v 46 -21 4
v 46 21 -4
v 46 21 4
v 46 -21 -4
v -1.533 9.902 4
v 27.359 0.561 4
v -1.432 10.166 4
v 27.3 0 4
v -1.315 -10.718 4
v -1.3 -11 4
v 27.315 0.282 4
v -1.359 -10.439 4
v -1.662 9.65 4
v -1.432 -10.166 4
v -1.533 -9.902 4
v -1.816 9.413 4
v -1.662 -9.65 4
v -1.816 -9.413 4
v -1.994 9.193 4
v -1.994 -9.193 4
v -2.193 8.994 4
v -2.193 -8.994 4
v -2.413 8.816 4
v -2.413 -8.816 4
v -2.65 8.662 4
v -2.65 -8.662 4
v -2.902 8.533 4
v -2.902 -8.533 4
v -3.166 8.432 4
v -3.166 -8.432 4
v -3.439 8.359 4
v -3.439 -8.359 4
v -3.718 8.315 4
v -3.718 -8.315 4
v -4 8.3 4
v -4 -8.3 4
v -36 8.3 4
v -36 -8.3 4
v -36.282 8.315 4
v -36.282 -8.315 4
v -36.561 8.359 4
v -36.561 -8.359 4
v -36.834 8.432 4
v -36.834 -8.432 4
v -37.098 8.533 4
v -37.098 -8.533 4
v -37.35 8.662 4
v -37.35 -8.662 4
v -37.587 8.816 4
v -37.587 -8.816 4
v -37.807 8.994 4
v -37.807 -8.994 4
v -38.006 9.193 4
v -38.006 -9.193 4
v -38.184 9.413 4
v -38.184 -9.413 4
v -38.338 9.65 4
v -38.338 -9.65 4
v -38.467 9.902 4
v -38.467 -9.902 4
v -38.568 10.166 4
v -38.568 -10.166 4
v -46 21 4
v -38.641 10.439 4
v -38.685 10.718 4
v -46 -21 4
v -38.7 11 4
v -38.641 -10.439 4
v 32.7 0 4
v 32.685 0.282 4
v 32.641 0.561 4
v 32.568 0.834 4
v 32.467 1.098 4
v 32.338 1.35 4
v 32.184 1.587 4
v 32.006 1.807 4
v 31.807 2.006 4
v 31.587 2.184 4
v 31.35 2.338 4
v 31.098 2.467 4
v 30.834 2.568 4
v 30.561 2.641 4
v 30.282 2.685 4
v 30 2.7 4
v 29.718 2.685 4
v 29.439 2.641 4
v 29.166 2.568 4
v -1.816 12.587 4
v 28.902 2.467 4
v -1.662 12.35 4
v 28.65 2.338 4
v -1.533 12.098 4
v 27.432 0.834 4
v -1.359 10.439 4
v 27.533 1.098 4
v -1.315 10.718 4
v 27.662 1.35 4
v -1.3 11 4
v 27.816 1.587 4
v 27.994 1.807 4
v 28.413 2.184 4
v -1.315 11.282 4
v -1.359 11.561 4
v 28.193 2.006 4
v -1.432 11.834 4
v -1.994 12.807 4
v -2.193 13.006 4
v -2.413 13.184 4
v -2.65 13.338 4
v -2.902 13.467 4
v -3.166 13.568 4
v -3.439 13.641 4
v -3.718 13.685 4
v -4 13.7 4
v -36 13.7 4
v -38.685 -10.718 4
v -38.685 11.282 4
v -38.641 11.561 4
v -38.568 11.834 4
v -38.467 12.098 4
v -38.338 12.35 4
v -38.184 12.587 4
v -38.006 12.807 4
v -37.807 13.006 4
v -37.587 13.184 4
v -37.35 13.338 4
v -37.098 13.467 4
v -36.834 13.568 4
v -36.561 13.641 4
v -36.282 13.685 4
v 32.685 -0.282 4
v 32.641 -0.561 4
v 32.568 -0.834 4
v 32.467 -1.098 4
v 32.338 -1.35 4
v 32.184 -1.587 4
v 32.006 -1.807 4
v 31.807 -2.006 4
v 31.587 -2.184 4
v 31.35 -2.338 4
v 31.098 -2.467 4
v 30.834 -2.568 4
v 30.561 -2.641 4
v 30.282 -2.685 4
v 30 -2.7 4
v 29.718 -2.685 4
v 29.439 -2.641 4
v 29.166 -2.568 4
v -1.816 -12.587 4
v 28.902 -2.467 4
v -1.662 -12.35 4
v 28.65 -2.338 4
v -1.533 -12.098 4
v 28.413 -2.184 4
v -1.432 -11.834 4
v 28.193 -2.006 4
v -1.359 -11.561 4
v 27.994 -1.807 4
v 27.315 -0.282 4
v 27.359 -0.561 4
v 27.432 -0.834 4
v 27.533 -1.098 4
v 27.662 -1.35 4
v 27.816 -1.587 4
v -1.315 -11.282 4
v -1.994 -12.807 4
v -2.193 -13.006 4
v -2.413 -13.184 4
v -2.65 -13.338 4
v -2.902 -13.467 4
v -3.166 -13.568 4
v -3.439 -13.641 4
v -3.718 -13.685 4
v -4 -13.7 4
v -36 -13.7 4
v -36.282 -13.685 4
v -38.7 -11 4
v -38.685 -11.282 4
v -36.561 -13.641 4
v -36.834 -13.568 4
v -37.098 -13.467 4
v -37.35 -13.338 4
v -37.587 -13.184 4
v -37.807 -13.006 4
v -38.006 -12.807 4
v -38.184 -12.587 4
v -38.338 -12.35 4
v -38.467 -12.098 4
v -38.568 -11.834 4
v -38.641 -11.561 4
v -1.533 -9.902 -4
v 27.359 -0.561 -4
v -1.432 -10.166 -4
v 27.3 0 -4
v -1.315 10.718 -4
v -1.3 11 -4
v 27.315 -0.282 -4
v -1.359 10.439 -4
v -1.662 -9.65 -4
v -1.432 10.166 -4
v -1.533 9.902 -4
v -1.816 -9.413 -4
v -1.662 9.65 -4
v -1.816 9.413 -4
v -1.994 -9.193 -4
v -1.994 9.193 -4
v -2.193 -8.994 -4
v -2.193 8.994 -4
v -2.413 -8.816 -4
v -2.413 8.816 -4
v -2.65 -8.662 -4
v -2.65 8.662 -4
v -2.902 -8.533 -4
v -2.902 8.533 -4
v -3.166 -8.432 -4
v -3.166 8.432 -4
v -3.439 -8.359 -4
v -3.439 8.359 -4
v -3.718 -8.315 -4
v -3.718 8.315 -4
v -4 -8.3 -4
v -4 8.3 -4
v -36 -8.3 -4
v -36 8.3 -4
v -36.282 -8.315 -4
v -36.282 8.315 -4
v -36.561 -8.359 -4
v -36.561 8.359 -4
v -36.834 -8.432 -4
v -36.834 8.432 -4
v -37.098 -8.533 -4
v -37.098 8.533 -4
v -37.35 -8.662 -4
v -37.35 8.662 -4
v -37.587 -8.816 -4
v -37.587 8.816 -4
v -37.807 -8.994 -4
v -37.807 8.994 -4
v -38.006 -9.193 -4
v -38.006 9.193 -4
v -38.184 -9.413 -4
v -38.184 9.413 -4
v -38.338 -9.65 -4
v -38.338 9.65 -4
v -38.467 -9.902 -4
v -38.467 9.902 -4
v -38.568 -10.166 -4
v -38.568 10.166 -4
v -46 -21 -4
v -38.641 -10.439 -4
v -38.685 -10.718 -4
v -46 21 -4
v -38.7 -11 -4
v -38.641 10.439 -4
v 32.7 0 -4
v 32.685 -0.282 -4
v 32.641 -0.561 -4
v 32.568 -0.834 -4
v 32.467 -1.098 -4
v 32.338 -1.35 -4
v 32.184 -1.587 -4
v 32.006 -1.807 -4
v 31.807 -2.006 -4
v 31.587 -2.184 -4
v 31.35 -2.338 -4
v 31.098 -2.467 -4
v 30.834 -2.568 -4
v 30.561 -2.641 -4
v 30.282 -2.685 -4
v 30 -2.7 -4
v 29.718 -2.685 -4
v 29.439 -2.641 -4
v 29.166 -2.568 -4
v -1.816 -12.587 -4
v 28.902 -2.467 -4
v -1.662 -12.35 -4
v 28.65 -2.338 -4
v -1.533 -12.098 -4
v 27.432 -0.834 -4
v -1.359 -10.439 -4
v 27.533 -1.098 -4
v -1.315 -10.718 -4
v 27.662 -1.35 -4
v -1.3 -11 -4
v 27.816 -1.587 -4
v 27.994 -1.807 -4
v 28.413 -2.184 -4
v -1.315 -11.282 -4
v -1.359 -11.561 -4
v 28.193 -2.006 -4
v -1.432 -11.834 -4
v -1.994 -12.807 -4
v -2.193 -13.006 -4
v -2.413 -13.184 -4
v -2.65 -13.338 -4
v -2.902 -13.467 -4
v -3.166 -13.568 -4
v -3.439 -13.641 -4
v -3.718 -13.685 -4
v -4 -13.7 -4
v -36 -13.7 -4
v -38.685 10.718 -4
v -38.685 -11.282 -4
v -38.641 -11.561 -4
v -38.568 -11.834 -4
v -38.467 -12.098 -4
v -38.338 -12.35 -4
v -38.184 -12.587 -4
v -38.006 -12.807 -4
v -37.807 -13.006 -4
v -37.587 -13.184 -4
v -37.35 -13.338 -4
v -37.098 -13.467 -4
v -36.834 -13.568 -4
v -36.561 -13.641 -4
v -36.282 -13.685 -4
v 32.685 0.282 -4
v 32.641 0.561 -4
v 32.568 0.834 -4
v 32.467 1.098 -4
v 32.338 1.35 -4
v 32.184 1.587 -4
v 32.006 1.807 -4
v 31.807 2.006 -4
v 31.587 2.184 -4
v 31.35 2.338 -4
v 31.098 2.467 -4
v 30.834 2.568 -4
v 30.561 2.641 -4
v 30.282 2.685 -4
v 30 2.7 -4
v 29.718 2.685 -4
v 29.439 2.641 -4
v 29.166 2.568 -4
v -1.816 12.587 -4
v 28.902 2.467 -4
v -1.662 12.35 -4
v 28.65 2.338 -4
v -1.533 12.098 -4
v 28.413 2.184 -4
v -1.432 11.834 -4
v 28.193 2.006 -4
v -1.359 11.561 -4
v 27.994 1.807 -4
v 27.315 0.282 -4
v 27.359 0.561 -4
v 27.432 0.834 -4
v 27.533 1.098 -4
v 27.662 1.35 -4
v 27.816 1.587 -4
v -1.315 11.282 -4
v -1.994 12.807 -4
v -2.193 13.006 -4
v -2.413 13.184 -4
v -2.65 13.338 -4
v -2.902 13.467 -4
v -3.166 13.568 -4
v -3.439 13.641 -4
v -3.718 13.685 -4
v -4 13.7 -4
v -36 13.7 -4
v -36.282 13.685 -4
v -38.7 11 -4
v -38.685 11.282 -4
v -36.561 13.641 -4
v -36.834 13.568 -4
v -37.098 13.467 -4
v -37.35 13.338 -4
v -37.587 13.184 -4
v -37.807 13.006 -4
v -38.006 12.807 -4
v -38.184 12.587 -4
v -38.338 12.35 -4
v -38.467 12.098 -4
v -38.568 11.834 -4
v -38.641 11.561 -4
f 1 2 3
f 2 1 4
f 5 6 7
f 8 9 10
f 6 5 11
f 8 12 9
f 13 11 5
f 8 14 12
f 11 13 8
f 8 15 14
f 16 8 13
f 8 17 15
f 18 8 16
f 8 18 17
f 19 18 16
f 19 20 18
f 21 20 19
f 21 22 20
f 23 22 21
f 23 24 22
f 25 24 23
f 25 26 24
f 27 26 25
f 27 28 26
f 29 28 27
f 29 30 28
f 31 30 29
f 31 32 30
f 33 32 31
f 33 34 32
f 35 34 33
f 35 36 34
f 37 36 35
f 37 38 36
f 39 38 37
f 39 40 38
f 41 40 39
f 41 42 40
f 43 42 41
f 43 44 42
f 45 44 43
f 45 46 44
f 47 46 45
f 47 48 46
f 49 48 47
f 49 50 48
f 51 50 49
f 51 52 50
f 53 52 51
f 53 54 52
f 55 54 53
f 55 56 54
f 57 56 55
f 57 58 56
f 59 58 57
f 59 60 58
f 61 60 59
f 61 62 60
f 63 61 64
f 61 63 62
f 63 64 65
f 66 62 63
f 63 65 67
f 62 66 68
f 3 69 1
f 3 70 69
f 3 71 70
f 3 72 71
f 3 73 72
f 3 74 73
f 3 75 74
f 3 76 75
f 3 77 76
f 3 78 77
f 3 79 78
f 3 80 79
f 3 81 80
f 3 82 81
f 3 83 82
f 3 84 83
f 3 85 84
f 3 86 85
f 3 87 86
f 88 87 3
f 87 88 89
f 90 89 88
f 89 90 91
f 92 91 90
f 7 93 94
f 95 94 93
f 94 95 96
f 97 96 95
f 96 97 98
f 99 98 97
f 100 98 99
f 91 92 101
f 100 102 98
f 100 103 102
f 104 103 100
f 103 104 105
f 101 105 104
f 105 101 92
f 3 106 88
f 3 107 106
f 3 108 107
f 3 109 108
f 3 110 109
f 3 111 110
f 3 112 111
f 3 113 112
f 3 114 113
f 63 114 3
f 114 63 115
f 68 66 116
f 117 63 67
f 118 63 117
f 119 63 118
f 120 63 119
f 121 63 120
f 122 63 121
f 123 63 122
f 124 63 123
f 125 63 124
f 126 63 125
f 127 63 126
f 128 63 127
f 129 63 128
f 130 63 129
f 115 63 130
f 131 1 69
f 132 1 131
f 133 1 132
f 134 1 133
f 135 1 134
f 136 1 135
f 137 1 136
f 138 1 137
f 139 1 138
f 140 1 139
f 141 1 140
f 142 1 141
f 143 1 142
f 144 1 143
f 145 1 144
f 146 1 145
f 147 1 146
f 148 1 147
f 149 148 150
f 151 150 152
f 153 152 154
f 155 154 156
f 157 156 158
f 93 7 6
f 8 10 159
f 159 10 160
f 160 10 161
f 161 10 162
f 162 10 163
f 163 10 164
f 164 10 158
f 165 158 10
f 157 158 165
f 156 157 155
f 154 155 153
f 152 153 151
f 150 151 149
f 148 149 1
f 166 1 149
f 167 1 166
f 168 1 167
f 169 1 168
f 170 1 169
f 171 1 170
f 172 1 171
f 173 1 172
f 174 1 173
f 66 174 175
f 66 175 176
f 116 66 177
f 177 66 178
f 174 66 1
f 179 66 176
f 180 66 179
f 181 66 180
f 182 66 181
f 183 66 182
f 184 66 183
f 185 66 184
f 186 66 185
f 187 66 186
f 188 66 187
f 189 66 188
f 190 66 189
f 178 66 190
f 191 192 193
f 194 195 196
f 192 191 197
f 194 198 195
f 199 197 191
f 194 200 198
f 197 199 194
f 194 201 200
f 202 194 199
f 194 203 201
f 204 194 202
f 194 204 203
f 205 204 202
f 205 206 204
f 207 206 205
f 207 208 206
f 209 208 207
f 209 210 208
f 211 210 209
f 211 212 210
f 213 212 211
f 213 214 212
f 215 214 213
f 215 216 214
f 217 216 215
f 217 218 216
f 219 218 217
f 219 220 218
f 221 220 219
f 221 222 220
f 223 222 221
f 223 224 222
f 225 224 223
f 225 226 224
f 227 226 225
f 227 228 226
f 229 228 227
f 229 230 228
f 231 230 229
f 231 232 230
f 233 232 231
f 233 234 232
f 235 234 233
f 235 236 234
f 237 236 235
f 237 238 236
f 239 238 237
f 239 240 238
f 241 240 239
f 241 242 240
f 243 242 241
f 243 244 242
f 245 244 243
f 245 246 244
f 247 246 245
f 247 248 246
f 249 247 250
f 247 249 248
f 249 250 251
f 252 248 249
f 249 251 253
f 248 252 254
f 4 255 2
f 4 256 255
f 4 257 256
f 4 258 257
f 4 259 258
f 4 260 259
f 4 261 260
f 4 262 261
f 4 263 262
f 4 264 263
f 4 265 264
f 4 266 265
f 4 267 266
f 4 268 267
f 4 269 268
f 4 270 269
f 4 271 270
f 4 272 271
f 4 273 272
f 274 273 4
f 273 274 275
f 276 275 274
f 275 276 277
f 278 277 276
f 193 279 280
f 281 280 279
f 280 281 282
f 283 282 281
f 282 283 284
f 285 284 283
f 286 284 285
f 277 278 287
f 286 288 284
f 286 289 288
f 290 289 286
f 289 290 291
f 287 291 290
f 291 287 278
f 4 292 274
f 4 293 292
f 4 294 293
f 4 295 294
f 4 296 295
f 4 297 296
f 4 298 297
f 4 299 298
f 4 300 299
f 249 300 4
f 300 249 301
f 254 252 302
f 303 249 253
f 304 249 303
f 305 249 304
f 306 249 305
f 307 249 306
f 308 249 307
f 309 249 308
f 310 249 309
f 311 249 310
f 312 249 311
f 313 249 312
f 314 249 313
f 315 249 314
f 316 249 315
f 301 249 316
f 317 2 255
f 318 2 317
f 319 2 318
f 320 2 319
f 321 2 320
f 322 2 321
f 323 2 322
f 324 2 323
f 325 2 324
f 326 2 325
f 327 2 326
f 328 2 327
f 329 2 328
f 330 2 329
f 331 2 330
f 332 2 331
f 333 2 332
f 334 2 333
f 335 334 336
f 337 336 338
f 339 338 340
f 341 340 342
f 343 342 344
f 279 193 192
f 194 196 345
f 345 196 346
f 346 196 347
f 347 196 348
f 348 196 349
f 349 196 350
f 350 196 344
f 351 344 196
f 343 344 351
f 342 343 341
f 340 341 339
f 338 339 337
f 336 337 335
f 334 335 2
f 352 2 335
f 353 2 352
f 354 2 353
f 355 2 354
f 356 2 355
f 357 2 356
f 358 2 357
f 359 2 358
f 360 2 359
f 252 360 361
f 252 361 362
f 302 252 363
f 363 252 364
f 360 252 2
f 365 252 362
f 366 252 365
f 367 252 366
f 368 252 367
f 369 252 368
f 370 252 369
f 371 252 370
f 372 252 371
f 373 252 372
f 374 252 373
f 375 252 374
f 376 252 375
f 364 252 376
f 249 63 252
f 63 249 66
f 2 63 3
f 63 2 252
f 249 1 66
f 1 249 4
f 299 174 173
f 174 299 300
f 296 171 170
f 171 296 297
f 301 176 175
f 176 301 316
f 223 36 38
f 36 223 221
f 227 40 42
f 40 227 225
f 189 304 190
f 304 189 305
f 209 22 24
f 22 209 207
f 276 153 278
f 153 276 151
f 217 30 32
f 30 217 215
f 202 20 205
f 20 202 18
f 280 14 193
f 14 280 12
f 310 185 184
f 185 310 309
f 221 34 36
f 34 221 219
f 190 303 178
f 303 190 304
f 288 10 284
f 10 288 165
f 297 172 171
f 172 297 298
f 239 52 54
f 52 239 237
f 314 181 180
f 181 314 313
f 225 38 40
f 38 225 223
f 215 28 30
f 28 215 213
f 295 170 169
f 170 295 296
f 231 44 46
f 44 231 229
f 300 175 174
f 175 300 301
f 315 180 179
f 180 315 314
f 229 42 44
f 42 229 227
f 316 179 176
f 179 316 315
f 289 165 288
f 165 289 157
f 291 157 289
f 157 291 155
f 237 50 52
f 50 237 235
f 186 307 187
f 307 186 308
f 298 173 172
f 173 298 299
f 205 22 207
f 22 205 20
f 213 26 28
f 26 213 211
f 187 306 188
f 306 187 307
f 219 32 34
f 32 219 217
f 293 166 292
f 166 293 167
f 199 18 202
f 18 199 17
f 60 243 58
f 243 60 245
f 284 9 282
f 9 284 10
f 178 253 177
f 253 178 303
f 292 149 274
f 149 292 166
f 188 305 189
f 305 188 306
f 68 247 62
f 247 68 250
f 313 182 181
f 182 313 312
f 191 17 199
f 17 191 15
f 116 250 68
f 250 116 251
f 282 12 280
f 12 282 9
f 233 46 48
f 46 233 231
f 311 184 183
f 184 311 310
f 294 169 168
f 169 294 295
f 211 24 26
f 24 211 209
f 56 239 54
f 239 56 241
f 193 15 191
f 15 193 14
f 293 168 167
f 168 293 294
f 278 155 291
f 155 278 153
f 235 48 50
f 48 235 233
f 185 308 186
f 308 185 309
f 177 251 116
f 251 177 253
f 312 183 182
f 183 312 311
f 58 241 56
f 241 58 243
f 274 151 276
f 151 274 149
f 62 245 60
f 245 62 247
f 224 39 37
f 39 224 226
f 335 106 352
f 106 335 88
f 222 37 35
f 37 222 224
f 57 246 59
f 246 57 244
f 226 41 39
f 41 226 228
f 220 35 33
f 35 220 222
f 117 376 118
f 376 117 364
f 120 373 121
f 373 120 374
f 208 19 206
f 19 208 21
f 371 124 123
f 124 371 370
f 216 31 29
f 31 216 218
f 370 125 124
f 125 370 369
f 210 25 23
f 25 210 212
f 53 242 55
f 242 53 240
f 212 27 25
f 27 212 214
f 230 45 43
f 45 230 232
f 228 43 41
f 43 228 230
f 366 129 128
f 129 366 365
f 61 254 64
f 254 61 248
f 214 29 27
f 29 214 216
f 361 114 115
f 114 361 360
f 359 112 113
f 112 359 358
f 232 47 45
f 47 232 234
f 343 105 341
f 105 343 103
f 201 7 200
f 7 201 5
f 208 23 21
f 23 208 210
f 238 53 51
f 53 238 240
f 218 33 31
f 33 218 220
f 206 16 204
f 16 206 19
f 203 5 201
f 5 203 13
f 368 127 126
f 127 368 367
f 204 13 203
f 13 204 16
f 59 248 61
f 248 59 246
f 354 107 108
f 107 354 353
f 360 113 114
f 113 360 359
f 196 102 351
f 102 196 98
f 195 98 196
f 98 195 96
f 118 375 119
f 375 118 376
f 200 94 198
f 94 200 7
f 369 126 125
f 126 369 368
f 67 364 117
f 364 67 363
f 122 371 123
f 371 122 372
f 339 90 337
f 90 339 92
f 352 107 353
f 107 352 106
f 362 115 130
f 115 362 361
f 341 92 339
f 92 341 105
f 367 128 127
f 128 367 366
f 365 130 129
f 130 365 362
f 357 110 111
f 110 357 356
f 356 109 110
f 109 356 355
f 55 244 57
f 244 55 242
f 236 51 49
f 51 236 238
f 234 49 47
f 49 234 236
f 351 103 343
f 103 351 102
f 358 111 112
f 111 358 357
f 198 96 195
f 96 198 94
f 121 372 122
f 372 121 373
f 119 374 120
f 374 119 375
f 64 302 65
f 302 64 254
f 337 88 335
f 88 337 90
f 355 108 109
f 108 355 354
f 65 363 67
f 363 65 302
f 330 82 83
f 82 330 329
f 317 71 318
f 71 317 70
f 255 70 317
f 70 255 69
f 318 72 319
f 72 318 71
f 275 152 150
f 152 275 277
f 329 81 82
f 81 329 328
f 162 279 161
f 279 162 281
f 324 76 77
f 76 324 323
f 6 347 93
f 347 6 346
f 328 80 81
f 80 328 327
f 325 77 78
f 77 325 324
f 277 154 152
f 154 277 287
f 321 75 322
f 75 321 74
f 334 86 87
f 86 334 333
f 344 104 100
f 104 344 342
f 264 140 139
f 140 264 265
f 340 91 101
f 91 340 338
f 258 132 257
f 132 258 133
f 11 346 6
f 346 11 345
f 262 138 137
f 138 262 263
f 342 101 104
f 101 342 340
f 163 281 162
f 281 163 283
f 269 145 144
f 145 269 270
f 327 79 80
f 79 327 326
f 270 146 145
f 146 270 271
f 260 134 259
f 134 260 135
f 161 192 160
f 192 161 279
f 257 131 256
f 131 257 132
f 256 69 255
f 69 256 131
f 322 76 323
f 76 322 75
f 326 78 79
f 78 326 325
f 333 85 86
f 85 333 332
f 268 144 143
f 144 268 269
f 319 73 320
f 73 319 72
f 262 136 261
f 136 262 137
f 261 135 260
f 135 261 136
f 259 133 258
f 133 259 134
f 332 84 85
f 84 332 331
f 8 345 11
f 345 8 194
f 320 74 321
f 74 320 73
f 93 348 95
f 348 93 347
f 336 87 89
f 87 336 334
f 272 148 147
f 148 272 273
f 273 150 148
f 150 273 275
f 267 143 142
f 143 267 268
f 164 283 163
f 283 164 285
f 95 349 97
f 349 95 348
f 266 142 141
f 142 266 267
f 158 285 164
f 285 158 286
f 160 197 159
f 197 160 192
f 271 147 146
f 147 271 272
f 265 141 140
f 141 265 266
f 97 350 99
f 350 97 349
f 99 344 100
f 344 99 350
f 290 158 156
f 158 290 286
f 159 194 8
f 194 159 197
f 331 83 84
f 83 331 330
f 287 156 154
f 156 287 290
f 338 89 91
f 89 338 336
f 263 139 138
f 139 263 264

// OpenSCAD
// GT2 tensioner slide 6 mm: GT2 idler tensioner slide for a 6 mm belt.
$fn = 60;
eps = 0.02;
slide_l = 92;
slide_w = 42;
slide_t = 8;
belt_w = 6;
mount_slot_l = 32;
mount_d = 5.4;
axle_d = 5.4;
axle_x = 30;

module horizontal_slot(x, y) {
    hull() {
        translate([x - mount_slot_l / 2, y, -slide_t / 2 - eps]) cylinder(d = mount_d, h = slide_t + 2 * eps);
        translate([x + mount_slot_l / 2, y, -slide_t / 2 - eps]) cylinder(d = mount_d, h = slide_t + 2 * eps);
    }
}

difference() {
    cube([slide_l, slide_w, slide_t], center = true);
    horizontal_slot(-20, -11);
    horizontal_slot(-20, 11);
    translate([axle_x, 0, -slide_t / 2 - eps]) cylinder(d = axle_d, h = slide_t + 2 * eps);
}
